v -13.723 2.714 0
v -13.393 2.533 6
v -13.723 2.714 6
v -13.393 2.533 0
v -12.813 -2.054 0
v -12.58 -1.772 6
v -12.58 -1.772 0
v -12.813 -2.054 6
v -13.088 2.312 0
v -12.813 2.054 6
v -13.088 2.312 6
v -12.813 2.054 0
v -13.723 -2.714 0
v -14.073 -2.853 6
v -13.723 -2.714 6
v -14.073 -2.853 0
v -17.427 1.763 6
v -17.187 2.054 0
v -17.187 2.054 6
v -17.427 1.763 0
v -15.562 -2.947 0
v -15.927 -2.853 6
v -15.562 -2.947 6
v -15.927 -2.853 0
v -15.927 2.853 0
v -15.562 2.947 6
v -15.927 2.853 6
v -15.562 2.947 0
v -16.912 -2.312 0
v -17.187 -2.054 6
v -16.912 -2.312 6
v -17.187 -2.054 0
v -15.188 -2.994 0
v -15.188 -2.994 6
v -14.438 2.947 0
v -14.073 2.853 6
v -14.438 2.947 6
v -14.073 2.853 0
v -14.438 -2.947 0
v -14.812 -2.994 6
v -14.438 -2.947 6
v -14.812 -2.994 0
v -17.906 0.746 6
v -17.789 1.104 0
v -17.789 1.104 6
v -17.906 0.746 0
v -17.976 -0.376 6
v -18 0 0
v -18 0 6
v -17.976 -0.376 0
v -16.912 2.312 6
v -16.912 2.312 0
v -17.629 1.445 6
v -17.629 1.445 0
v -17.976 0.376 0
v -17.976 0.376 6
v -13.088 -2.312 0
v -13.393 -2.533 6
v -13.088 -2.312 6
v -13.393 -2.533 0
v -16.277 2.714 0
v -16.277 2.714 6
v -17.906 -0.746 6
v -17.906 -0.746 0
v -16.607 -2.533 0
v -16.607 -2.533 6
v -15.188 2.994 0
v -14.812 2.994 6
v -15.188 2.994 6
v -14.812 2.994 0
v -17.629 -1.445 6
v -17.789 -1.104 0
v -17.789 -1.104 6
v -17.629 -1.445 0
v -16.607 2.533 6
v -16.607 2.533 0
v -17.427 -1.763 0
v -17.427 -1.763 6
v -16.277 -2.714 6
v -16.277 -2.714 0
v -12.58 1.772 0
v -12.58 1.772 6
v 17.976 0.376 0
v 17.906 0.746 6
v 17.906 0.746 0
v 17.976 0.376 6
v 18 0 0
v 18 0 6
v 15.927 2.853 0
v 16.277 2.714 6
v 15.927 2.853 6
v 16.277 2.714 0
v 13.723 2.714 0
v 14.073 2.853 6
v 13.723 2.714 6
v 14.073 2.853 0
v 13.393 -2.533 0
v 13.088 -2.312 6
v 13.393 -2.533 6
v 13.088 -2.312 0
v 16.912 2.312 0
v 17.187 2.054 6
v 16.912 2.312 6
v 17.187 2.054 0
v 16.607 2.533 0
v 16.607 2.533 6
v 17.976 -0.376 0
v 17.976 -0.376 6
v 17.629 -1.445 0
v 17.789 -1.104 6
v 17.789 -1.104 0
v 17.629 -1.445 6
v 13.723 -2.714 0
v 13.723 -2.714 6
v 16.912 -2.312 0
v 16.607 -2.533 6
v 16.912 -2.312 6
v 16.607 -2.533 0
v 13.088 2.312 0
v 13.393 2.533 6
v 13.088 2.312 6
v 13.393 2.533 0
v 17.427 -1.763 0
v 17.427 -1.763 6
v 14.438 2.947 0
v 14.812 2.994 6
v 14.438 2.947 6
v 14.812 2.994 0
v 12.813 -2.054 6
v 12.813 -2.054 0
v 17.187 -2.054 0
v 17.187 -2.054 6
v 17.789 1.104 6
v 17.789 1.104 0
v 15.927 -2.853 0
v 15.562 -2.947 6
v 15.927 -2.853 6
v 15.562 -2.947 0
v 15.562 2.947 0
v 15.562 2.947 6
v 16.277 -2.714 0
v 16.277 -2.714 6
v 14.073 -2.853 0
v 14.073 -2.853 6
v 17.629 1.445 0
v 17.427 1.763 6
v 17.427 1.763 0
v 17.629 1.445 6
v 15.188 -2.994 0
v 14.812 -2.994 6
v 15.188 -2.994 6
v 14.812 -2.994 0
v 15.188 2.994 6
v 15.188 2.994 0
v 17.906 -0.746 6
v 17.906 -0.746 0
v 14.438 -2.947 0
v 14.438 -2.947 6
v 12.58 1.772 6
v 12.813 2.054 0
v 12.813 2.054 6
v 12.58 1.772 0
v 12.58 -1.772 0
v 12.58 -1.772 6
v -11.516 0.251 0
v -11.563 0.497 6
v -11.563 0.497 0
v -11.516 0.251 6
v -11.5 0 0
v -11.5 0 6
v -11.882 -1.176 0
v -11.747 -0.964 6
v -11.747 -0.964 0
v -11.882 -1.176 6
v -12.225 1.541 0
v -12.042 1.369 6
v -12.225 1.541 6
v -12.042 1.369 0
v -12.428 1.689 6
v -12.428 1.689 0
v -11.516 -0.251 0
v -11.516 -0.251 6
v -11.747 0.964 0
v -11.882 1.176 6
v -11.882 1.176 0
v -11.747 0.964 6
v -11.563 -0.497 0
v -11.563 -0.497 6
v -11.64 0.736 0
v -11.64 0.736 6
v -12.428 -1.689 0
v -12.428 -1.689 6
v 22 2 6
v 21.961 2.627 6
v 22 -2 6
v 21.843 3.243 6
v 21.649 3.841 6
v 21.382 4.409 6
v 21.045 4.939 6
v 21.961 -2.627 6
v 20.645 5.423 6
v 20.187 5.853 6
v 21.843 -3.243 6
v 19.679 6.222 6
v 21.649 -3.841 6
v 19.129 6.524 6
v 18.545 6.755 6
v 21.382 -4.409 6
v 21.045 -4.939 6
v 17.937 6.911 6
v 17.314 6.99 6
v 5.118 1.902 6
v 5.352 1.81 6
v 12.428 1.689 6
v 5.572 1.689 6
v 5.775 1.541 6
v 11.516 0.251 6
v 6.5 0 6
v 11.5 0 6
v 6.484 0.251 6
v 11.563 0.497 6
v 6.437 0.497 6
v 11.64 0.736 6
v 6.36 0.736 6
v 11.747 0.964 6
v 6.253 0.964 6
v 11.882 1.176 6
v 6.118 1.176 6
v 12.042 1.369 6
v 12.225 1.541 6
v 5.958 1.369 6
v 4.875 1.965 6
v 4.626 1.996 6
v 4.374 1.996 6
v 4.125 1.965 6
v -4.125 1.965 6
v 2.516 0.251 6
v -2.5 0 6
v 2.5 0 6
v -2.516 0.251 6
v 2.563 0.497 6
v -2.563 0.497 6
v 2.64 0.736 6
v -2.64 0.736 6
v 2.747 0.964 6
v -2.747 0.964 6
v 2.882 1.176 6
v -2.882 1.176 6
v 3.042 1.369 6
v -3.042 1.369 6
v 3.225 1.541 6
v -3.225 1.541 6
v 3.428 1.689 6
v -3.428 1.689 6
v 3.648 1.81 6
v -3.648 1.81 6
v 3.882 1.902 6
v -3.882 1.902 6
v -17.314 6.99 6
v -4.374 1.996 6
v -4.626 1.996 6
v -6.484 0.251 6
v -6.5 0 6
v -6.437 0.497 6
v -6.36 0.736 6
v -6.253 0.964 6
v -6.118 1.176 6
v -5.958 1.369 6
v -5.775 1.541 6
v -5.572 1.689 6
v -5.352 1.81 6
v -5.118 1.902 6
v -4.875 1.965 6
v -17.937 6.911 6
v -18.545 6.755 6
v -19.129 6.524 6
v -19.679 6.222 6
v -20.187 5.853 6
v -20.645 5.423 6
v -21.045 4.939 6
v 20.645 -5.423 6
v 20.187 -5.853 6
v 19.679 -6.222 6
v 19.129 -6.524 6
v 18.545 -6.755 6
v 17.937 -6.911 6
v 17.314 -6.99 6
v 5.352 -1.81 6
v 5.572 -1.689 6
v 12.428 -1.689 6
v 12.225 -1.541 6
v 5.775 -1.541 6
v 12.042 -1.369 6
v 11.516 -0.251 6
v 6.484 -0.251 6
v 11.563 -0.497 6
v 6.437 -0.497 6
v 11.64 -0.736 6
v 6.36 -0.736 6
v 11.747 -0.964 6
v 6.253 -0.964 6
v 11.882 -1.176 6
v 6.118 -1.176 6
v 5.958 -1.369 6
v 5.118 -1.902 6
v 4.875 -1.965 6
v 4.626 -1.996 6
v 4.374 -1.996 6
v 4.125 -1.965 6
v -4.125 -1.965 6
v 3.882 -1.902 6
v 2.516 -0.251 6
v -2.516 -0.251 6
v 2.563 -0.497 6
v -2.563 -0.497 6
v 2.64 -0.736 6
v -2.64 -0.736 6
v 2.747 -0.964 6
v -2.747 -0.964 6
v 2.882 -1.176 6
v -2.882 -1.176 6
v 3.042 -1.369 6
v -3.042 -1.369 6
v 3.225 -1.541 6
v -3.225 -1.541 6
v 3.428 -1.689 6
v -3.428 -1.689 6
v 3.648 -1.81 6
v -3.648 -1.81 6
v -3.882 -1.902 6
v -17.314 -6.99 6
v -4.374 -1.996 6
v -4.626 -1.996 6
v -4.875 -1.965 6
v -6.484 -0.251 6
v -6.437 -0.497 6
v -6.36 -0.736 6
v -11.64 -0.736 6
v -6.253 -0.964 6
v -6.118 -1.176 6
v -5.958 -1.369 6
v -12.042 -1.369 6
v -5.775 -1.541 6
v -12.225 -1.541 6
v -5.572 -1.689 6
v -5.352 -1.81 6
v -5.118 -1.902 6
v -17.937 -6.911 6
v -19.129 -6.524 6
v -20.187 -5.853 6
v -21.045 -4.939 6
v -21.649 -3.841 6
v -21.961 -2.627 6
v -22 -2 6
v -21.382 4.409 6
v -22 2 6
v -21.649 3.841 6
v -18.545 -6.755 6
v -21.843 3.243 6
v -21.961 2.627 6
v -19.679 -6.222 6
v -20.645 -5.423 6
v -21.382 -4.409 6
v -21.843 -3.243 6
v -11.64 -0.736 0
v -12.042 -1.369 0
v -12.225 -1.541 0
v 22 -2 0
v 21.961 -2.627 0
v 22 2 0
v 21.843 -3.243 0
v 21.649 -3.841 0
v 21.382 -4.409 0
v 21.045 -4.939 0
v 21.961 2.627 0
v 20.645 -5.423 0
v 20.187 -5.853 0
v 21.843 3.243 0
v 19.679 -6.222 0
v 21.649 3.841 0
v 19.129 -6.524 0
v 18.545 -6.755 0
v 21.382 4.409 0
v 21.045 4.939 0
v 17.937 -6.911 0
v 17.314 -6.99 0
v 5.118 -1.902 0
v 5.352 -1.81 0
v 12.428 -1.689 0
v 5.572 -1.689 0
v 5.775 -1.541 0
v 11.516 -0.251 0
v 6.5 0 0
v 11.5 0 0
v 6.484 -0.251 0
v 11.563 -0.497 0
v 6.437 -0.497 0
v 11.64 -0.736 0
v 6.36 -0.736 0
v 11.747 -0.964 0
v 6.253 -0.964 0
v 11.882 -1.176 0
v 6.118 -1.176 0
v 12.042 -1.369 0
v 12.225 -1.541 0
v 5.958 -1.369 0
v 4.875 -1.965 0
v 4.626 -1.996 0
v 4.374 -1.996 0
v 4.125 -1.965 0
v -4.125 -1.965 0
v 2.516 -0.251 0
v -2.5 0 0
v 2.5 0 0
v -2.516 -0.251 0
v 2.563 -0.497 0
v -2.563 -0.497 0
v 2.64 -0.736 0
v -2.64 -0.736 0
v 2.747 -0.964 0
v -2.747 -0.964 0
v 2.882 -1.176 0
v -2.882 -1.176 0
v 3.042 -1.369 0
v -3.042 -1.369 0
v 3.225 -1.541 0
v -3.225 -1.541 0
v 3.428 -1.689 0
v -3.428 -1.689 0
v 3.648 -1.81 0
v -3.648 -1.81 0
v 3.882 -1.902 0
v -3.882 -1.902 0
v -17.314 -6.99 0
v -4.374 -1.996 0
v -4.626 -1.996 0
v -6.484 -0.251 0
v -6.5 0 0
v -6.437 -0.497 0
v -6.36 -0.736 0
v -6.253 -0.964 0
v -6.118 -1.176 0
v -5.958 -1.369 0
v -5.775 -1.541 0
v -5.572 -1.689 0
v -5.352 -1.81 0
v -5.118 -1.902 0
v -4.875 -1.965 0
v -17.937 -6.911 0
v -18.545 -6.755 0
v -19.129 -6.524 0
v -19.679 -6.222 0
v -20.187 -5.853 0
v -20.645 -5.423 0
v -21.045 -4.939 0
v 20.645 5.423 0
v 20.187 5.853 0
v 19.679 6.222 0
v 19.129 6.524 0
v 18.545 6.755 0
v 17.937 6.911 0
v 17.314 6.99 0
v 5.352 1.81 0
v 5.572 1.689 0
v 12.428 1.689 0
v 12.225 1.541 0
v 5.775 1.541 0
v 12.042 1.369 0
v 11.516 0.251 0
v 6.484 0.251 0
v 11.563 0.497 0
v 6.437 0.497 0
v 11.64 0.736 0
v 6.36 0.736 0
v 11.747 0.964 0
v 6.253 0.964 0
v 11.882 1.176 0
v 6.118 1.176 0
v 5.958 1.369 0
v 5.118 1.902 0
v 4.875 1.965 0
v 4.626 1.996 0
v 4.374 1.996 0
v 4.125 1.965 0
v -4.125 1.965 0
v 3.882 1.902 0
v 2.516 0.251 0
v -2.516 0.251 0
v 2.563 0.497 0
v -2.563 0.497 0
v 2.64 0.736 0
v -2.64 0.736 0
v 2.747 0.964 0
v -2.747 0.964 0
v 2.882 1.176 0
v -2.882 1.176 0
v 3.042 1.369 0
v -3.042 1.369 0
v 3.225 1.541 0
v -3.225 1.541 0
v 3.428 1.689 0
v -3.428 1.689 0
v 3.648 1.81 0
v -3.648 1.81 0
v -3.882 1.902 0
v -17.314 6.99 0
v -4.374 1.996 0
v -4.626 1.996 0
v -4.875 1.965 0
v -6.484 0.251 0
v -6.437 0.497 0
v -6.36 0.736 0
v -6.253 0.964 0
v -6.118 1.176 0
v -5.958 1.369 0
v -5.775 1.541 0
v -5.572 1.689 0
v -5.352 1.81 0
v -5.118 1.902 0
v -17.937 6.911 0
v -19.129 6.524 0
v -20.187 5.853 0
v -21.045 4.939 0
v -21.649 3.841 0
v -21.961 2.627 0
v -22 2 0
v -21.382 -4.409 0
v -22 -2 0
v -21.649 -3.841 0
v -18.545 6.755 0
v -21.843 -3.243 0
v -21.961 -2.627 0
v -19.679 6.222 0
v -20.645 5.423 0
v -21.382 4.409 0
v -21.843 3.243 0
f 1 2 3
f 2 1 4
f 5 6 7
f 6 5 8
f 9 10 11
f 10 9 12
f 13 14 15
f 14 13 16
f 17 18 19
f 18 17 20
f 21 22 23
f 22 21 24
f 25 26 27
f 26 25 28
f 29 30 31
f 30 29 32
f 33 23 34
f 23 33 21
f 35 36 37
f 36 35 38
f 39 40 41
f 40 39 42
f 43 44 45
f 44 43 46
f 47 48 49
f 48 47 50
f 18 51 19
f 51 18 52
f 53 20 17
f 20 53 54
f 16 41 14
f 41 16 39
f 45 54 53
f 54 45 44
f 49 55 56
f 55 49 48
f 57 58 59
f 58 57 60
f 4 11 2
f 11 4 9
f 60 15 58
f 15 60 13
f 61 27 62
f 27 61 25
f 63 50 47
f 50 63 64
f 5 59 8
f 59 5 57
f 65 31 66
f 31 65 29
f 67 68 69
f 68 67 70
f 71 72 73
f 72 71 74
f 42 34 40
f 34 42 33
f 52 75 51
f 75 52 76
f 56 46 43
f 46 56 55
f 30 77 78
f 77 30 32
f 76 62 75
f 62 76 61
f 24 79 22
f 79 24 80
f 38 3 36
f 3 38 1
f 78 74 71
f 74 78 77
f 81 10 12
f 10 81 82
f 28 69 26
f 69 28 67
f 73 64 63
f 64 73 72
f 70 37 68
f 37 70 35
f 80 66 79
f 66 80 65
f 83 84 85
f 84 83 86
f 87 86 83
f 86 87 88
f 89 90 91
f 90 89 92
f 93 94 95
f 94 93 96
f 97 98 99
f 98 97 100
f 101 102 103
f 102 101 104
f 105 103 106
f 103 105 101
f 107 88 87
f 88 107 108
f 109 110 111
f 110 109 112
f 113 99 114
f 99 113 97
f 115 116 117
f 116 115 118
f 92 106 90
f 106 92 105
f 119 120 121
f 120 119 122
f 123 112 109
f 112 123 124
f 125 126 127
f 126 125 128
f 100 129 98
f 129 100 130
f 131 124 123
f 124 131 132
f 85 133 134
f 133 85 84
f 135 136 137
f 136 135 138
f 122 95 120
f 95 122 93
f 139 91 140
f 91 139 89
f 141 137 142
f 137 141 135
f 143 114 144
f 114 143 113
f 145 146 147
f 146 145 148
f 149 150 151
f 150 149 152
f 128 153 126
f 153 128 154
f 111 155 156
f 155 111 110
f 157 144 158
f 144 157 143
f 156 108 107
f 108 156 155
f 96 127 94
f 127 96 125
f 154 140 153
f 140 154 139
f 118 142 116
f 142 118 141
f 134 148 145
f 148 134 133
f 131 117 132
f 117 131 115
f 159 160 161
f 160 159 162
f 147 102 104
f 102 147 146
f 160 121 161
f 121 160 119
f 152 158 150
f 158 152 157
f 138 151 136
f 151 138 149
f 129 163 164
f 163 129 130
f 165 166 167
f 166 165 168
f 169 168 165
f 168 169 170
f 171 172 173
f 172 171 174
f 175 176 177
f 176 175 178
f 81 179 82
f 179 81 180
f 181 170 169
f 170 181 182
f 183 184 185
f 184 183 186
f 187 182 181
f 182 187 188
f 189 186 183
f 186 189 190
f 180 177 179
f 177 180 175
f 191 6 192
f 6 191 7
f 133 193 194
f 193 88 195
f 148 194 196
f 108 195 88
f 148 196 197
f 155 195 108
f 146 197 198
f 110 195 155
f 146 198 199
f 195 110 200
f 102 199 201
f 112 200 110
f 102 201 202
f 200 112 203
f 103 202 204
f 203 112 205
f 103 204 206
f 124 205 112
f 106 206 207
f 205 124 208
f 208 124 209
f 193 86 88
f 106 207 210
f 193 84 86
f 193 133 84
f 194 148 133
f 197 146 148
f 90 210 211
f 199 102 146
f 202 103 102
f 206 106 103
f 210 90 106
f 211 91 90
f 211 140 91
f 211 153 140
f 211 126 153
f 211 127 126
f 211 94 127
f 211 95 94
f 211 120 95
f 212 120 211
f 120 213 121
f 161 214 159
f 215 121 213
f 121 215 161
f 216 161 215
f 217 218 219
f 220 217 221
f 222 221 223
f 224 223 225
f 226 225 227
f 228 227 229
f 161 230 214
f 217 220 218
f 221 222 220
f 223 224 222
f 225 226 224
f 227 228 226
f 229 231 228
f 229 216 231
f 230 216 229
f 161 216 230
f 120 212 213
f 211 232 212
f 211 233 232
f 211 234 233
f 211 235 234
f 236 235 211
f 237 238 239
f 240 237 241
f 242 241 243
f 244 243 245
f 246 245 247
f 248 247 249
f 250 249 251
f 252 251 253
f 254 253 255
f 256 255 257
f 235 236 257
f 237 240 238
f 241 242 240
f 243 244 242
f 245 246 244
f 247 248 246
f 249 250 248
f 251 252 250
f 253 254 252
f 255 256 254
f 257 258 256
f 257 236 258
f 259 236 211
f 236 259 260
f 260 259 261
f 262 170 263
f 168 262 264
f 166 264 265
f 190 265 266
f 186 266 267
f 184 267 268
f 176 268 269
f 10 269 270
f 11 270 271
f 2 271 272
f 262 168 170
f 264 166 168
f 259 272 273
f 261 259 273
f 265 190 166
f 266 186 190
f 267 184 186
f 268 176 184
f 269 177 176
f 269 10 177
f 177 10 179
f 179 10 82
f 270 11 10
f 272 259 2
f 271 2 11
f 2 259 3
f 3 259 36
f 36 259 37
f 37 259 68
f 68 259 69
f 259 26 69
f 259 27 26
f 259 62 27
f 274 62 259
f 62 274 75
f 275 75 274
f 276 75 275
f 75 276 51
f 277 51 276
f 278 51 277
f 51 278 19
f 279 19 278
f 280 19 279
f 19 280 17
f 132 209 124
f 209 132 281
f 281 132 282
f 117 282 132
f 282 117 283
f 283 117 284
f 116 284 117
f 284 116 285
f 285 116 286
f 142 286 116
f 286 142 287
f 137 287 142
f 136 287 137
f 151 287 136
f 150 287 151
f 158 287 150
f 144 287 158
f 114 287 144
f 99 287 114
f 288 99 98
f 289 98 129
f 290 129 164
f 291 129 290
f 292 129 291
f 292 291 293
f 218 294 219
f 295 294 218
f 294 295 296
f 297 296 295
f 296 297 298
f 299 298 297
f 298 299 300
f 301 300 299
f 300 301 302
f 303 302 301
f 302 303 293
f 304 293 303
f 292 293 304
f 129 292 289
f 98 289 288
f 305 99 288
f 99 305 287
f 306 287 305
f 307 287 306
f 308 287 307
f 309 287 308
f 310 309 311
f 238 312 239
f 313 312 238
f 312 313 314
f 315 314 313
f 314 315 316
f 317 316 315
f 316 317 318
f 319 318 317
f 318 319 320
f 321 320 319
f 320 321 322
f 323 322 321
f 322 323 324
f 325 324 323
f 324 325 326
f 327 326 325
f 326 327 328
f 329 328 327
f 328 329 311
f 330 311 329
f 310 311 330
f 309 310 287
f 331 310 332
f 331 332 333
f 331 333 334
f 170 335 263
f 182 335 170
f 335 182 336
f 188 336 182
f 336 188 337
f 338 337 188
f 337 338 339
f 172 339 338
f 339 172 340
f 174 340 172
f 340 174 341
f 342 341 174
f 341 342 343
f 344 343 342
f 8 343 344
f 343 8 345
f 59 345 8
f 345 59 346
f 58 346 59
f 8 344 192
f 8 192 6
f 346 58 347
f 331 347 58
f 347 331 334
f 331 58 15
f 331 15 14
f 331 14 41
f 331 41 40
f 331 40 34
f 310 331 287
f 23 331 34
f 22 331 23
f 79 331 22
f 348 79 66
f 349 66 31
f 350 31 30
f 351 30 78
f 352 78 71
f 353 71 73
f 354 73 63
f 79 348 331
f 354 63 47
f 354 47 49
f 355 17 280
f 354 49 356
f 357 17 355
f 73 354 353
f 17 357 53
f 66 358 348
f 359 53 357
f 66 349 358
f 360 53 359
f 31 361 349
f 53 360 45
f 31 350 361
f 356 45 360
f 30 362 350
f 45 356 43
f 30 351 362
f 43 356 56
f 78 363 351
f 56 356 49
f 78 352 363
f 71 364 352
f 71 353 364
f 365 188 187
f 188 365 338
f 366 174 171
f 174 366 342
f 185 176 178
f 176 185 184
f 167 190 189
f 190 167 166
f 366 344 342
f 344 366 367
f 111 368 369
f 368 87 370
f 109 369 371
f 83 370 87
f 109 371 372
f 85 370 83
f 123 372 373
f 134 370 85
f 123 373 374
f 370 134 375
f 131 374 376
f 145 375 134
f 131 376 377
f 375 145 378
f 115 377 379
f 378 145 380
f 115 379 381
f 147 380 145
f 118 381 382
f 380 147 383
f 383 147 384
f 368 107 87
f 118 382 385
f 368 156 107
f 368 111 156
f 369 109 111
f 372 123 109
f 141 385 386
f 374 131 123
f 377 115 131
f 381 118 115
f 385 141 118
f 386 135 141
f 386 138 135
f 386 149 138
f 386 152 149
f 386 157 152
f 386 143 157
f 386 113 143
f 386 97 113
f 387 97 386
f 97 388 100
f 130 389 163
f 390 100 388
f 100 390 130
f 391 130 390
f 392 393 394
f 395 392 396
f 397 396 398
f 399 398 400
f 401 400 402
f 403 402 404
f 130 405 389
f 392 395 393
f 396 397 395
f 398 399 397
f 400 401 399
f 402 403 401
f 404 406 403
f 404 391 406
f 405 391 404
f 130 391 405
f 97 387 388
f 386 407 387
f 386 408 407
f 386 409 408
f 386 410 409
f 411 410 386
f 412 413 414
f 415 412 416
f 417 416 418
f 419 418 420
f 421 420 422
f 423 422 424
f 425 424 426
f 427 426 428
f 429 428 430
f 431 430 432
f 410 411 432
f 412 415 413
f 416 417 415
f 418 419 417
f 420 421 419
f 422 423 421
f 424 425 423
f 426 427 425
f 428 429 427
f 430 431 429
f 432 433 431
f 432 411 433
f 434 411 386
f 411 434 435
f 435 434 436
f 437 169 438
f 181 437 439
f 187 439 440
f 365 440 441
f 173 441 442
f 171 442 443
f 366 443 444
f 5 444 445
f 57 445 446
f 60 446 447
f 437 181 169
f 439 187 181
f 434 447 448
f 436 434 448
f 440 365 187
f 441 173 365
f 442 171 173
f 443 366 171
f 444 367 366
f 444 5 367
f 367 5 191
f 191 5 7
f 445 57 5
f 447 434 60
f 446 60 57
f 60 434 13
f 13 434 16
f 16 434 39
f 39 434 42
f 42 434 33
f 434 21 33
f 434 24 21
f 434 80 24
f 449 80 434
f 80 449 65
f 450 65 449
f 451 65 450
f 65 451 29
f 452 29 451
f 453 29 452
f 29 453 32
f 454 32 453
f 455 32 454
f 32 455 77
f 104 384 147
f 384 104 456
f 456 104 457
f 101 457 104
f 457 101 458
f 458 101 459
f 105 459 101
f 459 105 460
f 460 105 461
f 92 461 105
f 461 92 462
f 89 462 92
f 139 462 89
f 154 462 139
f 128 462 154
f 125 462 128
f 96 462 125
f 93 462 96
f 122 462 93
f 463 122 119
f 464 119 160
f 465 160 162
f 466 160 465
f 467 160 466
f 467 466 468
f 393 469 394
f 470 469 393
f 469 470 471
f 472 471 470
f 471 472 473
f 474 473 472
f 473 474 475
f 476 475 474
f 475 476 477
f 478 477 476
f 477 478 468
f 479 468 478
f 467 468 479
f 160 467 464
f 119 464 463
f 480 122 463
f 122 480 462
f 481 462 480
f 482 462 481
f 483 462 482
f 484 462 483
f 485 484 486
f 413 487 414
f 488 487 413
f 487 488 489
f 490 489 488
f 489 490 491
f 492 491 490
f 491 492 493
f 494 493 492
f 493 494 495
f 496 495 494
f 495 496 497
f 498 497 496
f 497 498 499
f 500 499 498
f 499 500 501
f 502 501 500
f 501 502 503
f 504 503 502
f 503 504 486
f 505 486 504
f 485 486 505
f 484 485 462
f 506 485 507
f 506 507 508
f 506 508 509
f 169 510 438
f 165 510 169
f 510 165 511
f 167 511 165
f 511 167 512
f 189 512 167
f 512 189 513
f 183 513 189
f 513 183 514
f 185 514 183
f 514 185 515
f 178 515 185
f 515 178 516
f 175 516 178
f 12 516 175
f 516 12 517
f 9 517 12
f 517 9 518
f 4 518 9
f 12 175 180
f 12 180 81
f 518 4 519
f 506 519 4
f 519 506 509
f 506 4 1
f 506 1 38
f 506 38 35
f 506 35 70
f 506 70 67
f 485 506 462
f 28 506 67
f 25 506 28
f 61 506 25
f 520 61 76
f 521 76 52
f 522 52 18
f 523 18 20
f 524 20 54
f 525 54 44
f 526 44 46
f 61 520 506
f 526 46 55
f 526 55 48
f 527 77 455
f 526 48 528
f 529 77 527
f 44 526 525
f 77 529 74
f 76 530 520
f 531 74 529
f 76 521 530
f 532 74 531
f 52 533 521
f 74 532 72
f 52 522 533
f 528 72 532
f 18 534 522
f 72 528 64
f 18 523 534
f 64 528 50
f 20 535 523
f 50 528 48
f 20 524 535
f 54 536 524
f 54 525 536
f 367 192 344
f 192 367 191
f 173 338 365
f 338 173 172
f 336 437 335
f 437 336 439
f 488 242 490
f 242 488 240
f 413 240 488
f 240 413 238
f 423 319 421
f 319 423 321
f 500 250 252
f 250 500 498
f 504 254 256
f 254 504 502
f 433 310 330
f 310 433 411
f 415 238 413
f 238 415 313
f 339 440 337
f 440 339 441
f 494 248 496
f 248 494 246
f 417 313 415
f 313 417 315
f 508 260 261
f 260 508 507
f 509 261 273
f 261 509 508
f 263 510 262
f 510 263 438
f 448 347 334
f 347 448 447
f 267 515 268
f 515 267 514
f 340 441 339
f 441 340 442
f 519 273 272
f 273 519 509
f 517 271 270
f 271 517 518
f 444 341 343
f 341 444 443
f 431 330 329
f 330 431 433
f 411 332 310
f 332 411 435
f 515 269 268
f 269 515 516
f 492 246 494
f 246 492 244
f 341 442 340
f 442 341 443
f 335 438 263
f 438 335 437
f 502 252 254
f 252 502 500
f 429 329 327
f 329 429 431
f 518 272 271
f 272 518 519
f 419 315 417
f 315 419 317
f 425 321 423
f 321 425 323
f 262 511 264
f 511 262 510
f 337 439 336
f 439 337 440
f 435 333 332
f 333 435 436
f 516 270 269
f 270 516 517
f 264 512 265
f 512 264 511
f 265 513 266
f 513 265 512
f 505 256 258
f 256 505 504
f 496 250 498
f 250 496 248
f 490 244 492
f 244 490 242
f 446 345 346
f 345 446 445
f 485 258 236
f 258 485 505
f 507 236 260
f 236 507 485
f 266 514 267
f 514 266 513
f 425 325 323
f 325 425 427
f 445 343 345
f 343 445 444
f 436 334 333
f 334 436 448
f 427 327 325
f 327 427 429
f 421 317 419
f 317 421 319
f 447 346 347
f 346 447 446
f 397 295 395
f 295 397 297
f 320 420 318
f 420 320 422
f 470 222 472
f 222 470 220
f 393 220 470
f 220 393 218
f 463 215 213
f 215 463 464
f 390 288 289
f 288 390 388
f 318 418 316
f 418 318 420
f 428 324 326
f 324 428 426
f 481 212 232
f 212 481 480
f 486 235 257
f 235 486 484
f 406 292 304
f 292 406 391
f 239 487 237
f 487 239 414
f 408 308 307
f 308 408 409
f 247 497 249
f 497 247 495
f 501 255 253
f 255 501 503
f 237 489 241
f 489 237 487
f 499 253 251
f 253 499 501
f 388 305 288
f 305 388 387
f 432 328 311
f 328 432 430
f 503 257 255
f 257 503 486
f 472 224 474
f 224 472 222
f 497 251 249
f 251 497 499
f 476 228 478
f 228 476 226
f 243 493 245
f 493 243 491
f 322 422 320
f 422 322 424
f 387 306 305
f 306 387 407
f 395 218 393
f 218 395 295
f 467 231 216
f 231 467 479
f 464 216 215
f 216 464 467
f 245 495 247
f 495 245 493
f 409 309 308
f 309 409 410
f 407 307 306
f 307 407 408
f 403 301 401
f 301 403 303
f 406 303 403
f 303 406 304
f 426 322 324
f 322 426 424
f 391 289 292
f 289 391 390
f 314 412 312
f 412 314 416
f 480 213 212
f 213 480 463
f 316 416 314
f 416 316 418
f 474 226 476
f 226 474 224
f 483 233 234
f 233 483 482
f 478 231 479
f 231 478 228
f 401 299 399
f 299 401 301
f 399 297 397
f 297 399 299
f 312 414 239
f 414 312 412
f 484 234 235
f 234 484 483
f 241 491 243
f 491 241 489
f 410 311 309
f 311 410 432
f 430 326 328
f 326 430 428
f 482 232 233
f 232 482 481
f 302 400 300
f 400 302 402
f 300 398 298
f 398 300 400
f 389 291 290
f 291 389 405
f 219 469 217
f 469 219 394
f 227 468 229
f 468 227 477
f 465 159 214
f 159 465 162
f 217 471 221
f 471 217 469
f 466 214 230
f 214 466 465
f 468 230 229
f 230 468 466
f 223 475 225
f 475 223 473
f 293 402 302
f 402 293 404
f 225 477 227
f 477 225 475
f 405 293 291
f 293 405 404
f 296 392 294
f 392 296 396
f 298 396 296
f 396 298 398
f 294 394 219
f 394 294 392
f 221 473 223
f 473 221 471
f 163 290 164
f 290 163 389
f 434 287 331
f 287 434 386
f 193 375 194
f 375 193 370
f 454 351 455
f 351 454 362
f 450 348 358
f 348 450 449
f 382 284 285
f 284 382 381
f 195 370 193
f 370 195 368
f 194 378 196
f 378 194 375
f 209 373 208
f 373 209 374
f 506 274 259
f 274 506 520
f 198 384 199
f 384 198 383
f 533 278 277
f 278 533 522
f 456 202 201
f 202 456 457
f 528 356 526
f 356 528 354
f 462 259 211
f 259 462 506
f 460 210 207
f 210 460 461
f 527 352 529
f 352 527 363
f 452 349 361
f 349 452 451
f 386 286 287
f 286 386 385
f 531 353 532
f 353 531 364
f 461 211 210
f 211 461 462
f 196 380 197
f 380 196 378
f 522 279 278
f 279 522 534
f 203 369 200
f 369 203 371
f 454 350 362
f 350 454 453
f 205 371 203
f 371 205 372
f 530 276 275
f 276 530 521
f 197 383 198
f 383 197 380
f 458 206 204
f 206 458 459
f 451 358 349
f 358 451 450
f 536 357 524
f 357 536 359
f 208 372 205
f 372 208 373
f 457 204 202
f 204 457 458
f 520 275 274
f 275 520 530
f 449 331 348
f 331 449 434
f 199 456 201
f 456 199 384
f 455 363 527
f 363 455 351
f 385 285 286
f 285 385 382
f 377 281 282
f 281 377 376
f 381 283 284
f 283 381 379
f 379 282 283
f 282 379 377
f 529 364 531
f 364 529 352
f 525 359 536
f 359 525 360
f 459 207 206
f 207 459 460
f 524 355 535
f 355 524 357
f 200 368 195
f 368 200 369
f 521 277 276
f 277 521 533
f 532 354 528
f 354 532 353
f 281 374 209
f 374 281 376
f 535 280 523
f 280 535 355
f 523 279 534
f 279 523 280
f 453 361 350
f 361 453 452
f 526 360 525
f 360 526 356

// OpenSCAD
$fn = 50;


difference() {
	union() {
		hull() {
			translate(v = [-17.0000000000, 2.0000000000, 0]) {
				cylinder(h = 6, r = 5);
			}
			translate(v = [17.0000000000, 2.0000000000, 0]) {
				cylinder(h = 6, r = 5);
			}
			translate(v = [-17.0000000000, -2.0000000000, 0]) {
				cylinder(h = 6, r = 5);
			}
			translate(v = [17.0000000000, -2.0000000000, 0]) {
				cylinder(h = 6, r = 5);
			}
		}
	}
	union() {
		#translate(v = [-15.0000000000, 0.0000000000, -100.0000000000]) {
			cylinder(h = 200, r = 3.0000000000);
		}
		#translate(v = [-15.0000000000, 0.0000000000, -100.0000000000]) {
			cylinder(h = 200, r = 3.0000000000);
		}
		#translate(v = [15.0000000000, 0.0000000000, -100.0000000000]) {
			cylinder(h = 200, r = 3.0000000000);
		}
		#translate(v = [15.0000000000, 0.0000000000, -100.0000000000]) {
			cylinder(h = 200, r = 3.0000000000);
		}
		#translate(v = [-13.5000000000, 0, 0]) {
			cylinder(h = 6, r = 2.0000000000);
		}
		#translate(v = [-4.5000000000, 0, 0]) {
			cylinder(h = 6, r = 2.0000000000);
		}
		#translate(v = [4.5000000000, 0, 0]) {
			cylinder(h = 6, r = 2.0000000000);
		}
		#translate(v = [13.5000000000, 0, 0]) {
			cylinder(h = 6, r = 2.0000000000);
		}
	}
}
